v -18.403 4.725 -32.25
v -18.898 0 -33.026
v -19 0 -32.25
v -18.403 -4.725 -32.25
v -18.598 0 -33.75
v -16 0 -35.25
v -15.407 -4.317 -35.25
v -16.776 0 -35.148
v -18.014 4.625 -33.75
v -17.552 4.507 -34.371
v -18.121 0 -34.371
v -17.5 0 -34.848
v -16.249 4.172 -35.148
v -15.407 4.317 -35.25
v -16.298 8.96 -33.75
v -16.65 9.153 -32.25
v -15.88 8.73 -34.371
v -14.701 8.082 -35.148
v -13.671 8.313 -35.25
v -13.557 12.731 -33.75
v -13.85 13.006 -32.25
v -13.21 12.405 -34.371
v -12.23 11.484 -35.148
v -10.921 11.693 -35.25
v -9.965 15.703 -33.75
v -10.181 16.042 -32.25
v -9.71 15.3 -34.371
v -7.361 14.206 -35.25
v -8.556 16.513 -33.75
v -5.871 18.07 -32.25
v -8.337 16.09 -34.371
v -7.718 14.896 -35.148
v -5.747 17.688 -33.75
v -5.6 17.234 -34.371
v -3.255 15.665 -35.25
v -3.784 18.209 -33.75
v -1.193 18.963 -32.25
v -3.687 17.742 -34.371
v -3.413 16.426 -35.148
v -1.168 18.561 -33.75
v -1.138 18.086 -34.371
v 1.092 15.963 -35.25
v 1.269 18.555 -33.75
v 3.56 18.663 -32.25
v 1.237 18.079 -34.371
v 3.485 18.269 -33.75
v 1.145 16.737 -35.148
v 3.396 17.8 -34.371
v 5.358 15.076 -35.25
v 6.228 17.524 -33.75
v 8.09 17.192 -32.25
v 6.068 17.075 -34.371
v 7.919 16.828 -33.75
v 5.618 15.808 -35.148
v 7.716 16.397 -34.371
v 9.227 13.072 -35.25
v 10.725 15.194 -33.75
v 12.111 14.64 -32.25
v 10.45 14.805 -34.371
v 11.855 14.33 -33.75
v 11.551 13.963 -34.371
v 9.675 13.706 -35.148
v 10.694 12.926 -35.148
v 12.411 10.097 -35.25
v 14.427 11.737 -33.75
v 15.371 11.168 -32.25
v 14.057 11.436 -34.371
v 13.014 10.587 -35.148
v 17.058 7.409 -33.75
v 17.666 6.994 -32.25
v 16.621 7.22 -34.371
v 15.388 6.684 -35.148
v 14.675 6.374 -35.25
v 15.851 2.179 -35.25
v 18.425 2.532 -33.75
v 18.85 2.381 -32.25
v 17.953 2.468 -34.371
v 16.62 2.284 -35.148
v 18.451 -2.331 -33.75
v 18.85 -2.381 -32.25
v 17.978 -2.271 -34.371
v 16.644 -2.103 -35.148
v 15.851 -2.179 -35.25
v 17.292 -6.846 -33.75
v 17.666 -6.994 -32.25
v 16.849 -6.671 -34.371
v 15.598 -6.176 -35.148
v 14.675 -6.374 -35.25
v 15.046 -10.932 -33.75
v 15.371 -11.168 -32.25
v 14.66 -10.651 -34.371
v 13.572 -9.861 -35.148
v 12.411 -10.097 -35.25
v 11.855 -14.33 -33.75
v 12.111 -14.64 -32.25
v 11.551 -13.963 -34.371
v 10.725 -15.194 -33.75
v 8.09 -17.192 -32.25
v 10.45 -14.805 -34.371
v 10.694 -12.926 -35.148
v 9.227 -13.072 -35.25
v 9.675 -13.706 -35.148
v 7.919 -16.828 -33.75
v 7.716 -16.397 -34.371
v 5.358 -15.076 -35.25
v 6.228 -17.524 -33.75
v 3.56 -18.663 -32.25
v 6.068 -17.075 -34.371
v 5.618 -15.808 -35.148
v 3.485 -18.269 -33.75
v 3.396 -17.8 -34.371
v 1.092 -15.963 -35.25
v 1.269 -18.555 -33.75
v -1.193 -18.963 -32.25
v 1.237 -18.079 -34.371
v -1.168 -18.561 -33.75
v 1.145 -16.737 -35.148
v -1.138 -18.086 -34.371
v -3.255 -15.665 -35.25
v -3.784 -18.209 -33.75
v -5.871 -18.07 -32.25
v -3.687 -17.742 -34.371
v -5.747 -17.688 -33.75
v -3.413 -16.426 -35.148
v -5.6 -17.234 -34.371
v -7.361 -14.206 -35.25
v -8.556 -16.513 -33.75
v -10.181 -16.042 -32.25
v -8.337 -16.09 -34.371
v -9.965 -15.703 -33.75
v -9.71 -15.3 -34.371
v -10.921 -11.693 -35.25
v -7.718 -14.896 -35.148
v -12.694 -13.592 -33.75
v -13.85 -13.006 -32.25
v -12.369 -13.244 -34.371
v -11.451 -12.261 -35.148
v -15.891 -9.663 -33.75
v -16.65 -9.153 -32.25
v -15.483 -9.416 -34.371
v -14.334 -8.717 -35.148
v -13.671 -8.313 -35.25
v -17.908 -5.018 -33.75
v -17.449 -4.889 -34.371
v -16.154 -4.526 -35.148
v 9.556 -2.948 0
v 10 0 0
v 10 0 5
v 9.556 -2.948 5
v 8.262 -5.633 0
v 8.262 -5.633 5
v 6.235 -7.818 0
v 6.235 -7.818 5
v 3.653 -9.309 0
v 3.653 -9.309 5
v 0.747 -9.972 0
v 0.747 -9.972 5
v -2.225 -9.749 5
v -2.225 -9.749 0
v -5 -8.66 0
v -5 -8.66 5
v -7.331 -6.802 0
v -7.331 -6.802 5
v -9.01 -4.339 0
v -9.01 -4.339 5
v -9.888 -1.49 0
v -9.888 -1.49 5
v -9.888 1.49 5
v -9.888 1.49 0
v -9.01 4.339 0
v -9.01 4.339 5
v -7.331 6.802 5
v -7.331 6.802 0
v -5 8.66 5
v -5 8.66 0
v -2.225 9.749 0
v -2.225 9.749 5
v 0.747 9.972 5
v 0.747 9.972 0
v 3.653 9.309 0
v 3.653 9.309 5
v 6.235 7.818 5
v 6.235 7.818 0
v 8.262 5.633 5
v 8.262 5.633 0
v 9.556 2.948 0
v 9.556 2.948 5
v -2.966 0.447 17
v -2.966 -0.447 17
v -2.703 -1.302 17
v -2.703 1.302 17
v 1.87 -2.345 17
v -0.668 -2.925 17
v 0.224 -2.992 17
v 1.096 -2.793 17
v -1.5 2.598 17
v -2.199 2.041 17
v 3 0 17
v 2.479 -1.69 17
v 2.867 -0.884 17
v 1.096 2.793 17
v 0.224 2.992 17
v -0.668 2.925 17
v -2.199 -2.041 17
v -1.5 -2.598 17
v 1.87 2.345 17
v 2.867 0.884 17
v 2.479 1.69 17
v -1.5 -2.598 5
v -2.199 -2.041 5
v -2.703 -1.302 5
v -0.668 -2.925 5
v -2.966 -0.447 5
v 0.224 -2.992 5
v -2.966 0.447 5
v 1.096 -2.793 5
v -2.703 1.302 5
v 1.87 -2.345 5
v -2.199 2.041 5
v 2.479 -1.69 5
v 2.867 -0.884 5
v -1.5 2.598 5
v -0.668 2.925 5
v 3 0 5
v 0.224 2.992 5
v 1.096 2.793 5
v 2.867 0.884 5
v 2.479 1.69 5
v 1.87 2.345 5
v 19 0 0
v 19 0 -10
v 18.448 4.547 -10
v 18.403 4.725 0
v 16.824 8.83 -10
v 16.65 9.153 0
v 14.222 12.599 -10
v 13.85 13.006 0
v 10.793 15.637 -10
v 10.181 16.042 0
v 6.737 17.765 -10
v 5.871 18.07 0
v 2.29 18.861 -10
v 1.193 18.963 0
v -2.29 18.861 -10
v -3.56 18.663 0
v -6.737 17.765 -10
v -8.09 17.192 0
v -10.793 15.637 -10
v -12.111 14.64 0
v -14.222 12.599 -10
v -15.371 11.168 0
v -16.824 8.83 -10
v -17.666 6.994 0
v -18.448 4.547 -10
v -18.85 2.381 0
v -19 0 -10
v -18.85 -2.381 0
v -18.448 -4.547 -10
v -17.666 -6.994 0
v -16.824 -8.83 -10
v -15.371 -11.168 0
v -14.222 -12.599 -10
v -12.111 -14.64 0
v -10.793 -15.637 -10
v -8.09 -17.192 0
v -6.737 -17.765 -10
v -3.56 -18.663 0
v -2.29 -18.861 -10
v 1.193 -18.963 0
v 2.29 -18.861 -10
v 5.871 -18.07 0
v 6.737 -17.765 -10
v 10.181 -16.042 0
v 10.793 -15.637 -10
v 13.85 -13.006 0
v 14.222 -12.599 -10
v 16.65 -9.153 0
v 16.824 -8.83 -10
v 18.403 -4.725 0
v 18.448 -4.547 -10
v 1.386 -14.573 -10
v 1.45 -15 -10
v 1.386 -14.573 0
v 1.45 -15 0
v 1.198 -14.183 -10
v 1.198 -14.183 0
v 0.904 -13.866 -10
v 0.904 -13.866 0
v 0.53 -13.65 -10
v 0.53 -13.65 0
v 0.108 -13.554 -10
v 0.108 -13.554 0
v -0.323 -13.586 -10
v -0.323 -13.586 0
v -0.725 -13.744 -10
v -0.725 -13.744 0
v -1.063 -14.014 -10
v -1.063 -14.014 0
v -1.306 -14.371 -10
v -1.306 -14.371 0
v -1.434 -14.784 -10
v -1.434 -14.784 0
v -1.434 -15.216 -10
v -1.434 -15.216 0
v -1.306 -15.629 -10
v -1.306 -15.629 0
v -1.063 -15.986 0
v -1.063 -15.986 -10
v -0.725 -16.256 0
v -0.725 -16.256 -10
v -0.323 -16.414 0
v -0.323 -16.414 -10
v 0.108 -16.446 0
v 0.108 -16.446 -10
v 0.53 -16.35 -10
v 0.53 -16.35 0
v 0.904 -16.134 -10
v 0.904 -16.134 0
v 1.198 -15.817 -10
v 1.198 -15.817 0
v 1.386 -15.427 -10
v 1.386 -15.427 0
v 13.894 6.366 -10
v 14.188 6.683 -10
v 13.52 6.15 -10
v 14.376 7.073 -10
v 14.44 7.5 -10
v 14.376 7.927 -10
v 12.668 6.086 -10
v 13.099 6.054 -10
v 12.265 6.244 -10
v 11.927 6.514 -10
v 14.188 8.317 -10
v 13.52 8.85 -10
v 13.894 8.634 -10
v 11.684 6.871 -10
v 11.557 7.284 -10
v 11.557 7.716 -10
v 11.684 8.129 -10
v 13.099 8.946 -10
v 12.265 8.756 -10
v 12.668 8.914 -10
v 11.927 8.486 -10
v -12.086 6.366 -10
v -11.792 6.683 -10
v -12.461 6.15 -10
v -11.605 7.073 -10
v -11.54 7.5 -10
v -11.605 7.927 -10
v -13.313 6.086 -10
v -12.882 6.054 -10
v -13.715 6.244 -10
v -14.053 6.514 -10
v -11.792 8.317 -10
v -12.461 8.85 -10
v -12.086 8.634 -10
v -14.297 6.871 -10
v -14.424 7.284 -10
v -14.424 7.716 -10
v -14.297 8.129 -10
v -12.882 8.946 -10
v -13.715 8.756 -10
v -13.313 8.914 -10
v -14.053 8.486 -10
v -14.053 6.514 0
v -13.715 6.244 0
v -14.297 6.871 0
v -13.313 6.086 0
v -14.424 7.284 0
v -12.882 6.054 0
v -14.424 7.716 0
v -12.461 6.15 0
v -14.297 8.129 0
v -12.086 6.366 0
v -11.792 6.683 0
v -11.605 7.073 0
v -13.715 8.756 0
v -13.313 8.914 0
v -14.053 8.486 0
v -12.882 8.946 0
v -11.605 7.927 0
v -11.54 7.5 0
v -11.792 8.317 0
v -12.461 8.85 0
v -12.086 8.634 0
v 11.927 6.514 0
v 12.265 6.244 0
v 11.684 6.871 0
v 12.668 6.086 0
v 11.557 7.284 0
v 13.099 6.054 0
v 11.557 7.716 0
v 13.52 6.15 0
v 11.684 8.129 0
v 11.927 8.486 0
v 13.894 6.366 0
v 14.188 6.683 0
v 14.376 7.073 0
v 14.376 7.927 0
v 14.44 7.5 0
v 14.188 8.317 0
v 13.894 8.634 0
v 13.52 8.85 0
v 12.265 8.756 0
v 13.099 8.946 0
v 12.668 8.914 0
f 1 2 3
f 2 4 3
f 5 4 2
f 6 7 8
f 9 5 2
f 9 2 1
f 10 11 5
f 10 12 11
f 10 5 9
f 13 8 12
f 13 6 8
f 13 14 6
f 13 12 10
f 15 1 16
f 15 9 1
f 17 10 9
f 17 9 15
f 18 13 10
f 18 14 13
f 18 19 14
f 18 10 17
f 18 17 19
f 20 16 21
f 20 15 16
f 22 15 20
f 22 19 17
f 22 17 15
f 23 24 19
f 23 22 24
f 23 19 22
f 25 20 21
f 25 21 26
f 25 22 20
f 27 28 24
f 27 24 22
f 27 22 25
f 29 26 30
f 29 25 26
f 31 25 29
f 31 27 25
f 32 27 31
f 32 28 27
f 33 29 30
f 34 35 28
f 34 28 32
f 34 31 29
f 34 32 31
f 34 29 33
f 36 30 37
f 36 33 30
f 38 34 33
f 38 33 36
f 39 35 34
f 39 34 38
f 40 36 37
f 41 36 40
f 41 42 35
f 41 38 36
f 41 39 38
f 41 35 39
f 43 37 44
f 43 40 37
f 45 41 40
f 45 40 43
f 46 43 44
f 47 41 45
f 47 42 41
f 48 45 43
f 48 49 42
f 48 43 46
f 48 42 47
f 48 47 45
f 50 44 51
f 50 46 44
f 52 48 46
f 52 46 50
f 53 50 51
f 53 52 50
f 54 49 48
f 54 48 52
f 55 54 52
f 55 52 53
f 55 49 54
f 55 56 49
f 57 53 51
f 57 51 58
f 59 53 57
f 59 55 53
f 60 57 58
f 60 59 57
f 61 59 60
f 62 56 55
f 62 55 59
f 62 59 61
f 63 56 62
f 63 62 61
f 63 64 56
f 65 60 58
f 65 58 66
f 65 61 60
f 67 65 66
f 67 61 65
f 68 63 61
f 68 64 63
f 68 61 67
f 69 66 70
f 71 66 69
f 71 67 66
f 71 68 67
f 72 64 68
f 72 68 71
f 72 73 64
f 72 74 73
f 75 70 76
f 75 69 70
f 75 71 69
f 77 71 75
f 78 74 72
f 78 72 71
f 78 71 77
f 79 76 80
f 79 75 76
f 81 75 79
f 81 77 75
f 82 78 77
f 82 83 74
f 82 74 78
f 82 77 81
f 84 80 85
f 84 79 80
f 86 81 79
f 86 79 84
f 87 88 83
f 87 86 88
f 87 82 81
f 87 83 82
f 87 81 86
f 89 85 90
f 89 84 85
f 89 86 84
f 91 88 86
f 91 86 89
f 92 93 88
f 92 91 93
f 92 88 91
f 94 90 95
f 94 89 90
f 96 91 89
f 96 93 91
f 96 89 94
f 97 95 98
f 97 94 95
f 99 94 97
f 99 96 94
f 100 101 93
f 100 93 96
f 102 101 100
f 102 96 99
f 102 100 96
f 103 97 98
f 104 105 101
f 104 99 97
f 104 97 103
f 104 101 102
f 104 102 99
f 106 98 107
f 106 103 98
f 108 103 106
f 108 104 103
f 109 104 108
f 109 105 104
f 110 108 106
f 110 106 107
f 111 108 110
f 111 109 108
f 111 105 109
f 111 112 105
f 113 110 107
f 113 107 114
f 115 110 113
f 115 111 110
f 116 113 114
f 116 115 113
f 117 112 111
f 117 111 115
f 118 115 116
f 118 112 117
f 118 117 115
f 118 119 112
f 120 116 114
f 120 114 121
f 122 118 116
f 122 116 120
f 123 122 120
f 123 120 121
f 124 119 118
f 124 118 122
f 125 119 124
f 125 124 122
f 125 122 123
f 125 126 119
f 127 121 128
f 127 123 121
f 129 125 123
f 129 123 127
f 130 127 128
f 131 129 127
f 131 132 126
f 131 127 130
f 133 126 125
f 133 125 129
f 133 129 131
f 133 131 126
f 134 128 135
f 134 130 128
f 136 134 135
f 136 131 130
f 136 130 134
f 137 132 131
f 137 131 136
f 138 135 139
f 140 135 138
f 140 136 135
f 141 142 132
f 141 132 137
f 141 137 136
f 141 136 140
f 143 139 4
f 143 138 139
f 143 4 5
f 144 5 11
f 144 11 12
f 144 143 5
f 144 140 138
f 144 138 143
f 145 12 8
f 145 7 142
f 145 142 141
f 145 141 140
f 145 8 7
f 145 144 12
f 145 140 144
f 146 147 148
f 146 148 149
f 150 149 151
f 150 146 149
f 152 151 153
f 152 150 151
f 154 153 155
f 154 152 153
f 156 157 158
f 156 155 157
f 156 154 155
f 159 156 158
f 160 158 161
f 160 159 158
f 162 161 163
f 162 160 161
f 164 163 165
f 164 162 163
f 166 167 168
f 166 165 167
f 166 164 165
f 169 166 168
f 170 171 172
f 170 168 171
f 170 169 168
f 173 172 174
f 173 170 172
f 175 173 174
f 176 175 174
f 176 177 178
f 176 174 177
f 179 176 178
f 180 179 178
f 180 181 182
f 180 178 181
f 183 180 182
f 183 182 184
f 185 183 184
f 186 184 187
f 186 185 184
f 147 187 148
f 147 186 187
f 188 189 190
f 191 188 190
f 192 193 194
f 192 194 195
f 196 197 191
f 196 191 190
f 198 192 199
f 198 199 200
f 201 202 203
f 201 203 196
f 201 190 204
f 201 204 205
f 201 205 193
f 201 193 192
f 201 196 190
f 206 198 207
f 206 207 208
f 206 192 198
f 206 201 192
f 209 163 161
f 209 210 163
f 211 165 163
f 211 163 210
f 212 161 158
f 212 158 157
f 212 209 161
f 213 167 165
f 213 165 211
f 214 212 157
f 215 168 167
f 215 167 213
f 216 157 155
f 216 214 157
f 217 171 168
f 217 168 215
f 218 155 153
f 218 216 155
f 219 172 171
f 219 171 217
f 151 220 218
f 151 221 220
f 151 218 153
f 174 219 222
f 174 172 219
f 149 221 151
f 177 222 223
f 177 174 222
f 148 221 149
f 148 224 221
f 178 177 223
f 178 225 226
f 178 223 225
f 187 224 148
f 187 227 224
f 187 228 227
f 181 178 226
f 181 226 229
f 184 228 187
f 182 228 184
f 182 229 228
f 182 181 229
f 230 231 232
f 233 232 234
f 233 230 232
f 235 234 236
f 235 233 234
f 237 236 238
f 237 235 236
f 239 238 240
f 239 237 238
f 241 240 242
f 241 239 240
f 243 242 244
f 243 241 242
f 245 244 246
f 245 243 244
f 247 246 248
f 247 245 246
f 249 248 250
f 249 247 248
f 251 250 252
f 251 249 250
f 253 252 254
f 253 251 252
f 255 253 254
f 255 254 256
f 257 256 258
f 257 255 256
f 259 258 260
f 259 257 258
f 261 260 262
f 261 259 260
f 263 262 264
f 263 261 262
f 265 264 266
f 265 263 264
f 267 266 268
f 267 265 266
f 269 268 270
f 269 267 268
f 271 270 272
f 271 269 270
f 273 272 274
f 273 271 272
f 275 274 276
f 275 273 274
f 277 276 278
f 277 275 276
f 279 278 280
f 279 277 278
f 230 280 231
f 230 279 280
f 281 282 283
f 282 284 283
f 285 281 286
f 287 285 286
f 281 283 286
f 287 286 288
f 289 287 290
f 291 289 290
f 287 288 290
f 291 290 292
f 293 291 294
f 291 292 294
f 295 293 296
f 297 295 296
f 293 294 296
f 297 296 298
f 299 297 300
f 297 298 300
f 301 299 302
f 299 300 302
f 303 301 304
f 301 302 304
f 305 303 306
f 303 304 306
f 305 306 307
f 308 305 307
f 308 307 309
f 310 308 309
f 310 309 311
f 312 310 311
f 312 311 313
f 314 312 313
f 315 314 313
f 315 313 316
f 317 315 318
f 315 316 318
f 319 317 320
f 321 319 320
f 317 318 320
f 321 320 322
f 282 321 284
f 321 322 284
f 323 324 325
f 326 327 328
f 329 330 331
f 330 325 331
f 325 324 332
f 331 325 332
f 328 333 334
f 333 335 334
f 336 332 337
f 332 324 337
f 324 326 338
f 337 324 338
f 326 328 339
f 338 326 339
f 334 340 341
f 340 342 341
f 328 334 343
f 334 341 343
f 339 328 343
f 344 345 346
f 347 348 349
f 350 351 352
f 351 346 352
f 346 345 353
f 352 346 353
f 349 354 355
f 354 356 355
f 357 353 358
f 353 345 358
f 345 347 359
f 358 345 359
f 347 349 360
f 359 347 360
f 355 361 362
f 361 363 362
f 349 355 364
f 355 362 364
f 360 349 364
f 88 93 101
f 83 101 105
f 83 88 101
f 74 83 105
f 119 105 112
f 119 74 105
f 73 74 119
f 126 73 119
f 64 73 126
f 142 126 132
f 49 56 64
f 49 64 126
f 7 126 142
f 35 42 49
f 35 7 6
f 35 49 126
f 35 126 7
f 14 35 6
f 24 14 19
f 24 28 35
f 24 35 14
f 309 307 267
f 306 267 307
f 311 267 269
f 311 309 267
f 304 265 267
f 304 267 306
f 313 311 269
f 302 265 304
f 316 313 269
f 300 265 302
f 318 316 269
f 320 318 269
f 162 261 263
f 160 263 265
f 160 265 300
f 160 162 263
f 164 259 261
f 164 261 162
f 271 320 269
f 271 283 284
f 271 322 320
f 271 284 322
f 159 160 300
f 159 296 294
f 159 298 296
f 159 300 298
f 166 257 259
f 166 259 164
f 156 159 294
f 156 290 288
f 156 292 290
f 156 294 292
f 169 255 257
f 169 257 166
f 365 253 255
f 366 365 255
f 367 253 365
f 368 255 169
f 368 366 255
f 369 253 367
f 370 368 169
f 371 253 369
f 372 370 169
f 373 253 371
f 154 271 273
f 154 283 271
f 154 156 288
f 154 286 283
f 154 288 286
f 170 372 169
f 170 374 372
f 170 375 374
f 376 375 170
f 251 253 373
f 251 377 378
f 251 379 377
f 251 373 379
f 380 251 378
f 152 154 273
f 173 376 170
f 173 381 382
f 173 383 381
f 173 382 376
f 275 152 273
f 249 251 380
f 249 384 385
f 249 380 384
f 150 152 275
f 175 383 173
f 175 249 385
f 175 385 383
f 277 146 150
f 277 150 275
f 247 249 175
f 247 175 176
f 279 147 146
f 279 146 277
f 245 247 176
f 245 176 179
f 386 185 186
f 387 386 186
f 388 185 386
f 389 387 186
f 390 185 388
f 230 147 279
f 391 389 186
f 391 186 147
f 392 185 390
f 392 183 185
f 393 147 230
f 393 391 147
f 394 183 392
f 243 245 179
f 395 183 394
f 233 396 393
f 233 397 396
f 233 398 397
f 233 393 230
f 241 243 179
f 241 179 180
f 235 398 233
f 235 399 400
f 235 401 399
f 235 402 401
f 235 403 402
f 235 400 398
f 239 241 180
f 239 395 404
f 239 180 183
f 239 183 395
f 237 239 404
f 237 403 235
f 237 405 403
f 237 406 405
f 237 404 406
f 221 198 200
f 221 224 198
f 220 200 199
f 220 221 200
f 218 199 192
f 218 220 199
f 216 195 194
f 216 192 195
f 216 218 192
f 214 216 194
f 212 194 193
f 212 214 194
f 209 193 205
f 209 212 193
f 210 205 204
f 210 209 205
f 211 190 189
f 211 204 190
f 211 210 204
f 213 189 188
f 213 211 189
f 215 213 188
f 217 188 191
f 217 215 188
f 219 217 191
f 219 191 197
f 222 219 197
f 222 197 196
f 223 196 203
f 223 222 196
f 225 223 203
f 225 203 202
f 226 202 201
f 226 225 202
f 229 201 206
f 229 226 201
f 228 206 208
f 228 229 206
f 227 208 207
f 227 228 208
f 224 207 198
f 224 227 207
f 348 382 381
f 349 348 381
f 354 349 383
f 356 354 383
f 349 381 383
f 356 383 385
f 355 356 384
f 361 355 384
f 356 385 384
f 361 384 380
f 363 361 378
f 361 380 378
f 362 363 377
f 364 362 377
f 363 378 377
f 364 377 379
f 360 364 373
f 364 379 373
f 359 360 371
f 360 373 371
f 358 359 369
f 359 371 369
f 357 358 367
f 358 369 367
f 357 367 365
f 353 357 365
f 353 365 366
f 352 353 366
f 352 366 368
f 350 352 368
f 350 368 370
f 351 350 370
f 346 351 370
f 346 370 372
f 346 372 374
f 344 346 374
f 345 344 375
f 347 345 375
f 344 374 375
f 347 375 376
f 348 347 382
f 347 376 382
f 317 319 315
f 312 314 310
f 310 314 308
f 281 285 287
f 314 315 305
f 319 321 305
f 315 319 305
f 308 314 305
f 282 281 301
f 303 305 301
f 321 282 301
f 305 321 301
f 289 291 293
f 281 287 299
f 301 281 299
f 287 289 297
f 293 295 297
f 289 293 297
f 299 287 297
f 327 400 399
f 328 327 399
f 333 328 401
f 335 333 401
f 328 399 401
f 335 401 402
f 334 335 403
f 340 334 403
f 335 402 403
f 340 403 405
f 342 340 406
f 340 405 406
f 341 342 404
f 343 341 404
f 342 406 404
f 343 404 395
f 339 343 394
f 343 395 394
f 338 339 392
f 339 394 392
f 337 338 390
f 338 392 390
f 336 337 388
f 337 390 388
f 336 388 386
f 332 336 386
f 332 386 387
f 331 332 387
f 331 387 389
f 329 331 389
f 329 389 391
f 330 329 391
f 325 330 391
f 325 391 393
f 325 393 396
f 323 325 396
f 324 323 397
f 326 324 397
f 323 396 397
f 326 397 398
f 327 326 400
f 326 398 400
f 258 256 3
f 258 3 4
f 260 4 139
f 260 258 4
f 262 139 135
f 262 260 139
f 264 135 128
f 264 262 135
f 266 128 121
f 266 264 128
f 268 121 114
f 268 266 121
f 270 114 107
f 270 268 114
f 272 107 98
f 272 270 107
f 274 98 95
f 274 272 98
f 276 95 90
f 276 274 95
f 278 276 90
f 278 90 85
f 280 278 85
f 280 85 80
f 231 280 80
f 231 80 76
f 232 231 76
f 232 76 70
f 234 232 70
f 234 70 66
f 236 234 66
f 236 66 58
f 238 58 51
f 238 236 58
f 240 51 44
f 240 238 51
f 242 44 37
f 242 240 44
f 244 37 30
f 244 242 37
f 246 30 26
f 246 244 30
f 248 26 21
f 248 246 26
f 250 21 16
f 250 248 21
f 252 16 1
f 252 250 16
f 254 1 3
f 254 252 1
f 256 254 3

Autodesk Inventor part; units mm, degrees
ref_plane "YZ Plane" through (0, 0, 0) normal (1, 0, 0) x (0, 1, 0)
ref_plane "XZ Plane" through (0, 0, 0) normal (0, 1, 0) x (-1, 0, 0)
ref_plane "XY Plane" through (0, 0, 0) normal (0, 0, 1) x (1, 0, 0)
sketch "Sketch1" plane through (0, 0, 0) normal (0, 0, 1) x (1, 0, 0)
  circle A0 centre (0, 0) radius 15 construction
  line L0 (0, 0) -> (-12.9904, 7.5) construction
  line L1 (0, 0) -> (12.9904, 7.5) construction
  line L2 (0, 0) -> (0, -15) construction
  circle A1 centre (-12.9904, 7.5) radius 1.45
  circle A2 centre (12.9904, 7.5) radius 1.45
  circle A3 centre (0, -15) radius 1.45
  circle A4 centre (0, 0) radius 3 construction
  circle A5 centre (0, 0) radius 19
  dimension "d0" = 120
  dimension "d1" = 120
  dimension "d2" = 120
  dimension "d3" = 2.9
  dimension "d4" = 6
  dimension "d5" = 15
  dimension "d6" = 30
  dimension "d7" = 38
extrude "Extrusion1" add sketch "Sketch1" against normal blind 10
sketch "Sketch2" plane through (0, 0, -10) normal (0, 0, -1) x (-1, 0, 0)
  circle A0 centre (0, 0) radius 19 projected
extrude "Extrusion2" add sketch "Sketch2" along normal blind 25.25
fillet "Fillet1" radius 3 1 edges at (19, 0, -35.25)
sketch "Sketch3" plane through (0, 0, 0) normal (0, 0, 1) x (1, 0, 0)
  circle A0 centre (0, 0) radius 19 projected
  circle A1 centre (0, 0) radius 10
  dimension "d13" = 20
extrude "Extrusion3" add sketch "Sketch3" along normal blind 5 contours A1
sketch "Sketch4" plane through (0, 0, 5) normal (0, 0, 1) x (1, 0, 0)
  circle A0 centre (0, 0) radius 10 projected
  circle A1 centre (0, 0) radius 3
  dimension "d16" = 6
extrude "Extrusion4" add sketch "Sketch4" along normal blind 12 contours A1
equation "\"d1\" = d0"
properties part number "rotary encoder"
